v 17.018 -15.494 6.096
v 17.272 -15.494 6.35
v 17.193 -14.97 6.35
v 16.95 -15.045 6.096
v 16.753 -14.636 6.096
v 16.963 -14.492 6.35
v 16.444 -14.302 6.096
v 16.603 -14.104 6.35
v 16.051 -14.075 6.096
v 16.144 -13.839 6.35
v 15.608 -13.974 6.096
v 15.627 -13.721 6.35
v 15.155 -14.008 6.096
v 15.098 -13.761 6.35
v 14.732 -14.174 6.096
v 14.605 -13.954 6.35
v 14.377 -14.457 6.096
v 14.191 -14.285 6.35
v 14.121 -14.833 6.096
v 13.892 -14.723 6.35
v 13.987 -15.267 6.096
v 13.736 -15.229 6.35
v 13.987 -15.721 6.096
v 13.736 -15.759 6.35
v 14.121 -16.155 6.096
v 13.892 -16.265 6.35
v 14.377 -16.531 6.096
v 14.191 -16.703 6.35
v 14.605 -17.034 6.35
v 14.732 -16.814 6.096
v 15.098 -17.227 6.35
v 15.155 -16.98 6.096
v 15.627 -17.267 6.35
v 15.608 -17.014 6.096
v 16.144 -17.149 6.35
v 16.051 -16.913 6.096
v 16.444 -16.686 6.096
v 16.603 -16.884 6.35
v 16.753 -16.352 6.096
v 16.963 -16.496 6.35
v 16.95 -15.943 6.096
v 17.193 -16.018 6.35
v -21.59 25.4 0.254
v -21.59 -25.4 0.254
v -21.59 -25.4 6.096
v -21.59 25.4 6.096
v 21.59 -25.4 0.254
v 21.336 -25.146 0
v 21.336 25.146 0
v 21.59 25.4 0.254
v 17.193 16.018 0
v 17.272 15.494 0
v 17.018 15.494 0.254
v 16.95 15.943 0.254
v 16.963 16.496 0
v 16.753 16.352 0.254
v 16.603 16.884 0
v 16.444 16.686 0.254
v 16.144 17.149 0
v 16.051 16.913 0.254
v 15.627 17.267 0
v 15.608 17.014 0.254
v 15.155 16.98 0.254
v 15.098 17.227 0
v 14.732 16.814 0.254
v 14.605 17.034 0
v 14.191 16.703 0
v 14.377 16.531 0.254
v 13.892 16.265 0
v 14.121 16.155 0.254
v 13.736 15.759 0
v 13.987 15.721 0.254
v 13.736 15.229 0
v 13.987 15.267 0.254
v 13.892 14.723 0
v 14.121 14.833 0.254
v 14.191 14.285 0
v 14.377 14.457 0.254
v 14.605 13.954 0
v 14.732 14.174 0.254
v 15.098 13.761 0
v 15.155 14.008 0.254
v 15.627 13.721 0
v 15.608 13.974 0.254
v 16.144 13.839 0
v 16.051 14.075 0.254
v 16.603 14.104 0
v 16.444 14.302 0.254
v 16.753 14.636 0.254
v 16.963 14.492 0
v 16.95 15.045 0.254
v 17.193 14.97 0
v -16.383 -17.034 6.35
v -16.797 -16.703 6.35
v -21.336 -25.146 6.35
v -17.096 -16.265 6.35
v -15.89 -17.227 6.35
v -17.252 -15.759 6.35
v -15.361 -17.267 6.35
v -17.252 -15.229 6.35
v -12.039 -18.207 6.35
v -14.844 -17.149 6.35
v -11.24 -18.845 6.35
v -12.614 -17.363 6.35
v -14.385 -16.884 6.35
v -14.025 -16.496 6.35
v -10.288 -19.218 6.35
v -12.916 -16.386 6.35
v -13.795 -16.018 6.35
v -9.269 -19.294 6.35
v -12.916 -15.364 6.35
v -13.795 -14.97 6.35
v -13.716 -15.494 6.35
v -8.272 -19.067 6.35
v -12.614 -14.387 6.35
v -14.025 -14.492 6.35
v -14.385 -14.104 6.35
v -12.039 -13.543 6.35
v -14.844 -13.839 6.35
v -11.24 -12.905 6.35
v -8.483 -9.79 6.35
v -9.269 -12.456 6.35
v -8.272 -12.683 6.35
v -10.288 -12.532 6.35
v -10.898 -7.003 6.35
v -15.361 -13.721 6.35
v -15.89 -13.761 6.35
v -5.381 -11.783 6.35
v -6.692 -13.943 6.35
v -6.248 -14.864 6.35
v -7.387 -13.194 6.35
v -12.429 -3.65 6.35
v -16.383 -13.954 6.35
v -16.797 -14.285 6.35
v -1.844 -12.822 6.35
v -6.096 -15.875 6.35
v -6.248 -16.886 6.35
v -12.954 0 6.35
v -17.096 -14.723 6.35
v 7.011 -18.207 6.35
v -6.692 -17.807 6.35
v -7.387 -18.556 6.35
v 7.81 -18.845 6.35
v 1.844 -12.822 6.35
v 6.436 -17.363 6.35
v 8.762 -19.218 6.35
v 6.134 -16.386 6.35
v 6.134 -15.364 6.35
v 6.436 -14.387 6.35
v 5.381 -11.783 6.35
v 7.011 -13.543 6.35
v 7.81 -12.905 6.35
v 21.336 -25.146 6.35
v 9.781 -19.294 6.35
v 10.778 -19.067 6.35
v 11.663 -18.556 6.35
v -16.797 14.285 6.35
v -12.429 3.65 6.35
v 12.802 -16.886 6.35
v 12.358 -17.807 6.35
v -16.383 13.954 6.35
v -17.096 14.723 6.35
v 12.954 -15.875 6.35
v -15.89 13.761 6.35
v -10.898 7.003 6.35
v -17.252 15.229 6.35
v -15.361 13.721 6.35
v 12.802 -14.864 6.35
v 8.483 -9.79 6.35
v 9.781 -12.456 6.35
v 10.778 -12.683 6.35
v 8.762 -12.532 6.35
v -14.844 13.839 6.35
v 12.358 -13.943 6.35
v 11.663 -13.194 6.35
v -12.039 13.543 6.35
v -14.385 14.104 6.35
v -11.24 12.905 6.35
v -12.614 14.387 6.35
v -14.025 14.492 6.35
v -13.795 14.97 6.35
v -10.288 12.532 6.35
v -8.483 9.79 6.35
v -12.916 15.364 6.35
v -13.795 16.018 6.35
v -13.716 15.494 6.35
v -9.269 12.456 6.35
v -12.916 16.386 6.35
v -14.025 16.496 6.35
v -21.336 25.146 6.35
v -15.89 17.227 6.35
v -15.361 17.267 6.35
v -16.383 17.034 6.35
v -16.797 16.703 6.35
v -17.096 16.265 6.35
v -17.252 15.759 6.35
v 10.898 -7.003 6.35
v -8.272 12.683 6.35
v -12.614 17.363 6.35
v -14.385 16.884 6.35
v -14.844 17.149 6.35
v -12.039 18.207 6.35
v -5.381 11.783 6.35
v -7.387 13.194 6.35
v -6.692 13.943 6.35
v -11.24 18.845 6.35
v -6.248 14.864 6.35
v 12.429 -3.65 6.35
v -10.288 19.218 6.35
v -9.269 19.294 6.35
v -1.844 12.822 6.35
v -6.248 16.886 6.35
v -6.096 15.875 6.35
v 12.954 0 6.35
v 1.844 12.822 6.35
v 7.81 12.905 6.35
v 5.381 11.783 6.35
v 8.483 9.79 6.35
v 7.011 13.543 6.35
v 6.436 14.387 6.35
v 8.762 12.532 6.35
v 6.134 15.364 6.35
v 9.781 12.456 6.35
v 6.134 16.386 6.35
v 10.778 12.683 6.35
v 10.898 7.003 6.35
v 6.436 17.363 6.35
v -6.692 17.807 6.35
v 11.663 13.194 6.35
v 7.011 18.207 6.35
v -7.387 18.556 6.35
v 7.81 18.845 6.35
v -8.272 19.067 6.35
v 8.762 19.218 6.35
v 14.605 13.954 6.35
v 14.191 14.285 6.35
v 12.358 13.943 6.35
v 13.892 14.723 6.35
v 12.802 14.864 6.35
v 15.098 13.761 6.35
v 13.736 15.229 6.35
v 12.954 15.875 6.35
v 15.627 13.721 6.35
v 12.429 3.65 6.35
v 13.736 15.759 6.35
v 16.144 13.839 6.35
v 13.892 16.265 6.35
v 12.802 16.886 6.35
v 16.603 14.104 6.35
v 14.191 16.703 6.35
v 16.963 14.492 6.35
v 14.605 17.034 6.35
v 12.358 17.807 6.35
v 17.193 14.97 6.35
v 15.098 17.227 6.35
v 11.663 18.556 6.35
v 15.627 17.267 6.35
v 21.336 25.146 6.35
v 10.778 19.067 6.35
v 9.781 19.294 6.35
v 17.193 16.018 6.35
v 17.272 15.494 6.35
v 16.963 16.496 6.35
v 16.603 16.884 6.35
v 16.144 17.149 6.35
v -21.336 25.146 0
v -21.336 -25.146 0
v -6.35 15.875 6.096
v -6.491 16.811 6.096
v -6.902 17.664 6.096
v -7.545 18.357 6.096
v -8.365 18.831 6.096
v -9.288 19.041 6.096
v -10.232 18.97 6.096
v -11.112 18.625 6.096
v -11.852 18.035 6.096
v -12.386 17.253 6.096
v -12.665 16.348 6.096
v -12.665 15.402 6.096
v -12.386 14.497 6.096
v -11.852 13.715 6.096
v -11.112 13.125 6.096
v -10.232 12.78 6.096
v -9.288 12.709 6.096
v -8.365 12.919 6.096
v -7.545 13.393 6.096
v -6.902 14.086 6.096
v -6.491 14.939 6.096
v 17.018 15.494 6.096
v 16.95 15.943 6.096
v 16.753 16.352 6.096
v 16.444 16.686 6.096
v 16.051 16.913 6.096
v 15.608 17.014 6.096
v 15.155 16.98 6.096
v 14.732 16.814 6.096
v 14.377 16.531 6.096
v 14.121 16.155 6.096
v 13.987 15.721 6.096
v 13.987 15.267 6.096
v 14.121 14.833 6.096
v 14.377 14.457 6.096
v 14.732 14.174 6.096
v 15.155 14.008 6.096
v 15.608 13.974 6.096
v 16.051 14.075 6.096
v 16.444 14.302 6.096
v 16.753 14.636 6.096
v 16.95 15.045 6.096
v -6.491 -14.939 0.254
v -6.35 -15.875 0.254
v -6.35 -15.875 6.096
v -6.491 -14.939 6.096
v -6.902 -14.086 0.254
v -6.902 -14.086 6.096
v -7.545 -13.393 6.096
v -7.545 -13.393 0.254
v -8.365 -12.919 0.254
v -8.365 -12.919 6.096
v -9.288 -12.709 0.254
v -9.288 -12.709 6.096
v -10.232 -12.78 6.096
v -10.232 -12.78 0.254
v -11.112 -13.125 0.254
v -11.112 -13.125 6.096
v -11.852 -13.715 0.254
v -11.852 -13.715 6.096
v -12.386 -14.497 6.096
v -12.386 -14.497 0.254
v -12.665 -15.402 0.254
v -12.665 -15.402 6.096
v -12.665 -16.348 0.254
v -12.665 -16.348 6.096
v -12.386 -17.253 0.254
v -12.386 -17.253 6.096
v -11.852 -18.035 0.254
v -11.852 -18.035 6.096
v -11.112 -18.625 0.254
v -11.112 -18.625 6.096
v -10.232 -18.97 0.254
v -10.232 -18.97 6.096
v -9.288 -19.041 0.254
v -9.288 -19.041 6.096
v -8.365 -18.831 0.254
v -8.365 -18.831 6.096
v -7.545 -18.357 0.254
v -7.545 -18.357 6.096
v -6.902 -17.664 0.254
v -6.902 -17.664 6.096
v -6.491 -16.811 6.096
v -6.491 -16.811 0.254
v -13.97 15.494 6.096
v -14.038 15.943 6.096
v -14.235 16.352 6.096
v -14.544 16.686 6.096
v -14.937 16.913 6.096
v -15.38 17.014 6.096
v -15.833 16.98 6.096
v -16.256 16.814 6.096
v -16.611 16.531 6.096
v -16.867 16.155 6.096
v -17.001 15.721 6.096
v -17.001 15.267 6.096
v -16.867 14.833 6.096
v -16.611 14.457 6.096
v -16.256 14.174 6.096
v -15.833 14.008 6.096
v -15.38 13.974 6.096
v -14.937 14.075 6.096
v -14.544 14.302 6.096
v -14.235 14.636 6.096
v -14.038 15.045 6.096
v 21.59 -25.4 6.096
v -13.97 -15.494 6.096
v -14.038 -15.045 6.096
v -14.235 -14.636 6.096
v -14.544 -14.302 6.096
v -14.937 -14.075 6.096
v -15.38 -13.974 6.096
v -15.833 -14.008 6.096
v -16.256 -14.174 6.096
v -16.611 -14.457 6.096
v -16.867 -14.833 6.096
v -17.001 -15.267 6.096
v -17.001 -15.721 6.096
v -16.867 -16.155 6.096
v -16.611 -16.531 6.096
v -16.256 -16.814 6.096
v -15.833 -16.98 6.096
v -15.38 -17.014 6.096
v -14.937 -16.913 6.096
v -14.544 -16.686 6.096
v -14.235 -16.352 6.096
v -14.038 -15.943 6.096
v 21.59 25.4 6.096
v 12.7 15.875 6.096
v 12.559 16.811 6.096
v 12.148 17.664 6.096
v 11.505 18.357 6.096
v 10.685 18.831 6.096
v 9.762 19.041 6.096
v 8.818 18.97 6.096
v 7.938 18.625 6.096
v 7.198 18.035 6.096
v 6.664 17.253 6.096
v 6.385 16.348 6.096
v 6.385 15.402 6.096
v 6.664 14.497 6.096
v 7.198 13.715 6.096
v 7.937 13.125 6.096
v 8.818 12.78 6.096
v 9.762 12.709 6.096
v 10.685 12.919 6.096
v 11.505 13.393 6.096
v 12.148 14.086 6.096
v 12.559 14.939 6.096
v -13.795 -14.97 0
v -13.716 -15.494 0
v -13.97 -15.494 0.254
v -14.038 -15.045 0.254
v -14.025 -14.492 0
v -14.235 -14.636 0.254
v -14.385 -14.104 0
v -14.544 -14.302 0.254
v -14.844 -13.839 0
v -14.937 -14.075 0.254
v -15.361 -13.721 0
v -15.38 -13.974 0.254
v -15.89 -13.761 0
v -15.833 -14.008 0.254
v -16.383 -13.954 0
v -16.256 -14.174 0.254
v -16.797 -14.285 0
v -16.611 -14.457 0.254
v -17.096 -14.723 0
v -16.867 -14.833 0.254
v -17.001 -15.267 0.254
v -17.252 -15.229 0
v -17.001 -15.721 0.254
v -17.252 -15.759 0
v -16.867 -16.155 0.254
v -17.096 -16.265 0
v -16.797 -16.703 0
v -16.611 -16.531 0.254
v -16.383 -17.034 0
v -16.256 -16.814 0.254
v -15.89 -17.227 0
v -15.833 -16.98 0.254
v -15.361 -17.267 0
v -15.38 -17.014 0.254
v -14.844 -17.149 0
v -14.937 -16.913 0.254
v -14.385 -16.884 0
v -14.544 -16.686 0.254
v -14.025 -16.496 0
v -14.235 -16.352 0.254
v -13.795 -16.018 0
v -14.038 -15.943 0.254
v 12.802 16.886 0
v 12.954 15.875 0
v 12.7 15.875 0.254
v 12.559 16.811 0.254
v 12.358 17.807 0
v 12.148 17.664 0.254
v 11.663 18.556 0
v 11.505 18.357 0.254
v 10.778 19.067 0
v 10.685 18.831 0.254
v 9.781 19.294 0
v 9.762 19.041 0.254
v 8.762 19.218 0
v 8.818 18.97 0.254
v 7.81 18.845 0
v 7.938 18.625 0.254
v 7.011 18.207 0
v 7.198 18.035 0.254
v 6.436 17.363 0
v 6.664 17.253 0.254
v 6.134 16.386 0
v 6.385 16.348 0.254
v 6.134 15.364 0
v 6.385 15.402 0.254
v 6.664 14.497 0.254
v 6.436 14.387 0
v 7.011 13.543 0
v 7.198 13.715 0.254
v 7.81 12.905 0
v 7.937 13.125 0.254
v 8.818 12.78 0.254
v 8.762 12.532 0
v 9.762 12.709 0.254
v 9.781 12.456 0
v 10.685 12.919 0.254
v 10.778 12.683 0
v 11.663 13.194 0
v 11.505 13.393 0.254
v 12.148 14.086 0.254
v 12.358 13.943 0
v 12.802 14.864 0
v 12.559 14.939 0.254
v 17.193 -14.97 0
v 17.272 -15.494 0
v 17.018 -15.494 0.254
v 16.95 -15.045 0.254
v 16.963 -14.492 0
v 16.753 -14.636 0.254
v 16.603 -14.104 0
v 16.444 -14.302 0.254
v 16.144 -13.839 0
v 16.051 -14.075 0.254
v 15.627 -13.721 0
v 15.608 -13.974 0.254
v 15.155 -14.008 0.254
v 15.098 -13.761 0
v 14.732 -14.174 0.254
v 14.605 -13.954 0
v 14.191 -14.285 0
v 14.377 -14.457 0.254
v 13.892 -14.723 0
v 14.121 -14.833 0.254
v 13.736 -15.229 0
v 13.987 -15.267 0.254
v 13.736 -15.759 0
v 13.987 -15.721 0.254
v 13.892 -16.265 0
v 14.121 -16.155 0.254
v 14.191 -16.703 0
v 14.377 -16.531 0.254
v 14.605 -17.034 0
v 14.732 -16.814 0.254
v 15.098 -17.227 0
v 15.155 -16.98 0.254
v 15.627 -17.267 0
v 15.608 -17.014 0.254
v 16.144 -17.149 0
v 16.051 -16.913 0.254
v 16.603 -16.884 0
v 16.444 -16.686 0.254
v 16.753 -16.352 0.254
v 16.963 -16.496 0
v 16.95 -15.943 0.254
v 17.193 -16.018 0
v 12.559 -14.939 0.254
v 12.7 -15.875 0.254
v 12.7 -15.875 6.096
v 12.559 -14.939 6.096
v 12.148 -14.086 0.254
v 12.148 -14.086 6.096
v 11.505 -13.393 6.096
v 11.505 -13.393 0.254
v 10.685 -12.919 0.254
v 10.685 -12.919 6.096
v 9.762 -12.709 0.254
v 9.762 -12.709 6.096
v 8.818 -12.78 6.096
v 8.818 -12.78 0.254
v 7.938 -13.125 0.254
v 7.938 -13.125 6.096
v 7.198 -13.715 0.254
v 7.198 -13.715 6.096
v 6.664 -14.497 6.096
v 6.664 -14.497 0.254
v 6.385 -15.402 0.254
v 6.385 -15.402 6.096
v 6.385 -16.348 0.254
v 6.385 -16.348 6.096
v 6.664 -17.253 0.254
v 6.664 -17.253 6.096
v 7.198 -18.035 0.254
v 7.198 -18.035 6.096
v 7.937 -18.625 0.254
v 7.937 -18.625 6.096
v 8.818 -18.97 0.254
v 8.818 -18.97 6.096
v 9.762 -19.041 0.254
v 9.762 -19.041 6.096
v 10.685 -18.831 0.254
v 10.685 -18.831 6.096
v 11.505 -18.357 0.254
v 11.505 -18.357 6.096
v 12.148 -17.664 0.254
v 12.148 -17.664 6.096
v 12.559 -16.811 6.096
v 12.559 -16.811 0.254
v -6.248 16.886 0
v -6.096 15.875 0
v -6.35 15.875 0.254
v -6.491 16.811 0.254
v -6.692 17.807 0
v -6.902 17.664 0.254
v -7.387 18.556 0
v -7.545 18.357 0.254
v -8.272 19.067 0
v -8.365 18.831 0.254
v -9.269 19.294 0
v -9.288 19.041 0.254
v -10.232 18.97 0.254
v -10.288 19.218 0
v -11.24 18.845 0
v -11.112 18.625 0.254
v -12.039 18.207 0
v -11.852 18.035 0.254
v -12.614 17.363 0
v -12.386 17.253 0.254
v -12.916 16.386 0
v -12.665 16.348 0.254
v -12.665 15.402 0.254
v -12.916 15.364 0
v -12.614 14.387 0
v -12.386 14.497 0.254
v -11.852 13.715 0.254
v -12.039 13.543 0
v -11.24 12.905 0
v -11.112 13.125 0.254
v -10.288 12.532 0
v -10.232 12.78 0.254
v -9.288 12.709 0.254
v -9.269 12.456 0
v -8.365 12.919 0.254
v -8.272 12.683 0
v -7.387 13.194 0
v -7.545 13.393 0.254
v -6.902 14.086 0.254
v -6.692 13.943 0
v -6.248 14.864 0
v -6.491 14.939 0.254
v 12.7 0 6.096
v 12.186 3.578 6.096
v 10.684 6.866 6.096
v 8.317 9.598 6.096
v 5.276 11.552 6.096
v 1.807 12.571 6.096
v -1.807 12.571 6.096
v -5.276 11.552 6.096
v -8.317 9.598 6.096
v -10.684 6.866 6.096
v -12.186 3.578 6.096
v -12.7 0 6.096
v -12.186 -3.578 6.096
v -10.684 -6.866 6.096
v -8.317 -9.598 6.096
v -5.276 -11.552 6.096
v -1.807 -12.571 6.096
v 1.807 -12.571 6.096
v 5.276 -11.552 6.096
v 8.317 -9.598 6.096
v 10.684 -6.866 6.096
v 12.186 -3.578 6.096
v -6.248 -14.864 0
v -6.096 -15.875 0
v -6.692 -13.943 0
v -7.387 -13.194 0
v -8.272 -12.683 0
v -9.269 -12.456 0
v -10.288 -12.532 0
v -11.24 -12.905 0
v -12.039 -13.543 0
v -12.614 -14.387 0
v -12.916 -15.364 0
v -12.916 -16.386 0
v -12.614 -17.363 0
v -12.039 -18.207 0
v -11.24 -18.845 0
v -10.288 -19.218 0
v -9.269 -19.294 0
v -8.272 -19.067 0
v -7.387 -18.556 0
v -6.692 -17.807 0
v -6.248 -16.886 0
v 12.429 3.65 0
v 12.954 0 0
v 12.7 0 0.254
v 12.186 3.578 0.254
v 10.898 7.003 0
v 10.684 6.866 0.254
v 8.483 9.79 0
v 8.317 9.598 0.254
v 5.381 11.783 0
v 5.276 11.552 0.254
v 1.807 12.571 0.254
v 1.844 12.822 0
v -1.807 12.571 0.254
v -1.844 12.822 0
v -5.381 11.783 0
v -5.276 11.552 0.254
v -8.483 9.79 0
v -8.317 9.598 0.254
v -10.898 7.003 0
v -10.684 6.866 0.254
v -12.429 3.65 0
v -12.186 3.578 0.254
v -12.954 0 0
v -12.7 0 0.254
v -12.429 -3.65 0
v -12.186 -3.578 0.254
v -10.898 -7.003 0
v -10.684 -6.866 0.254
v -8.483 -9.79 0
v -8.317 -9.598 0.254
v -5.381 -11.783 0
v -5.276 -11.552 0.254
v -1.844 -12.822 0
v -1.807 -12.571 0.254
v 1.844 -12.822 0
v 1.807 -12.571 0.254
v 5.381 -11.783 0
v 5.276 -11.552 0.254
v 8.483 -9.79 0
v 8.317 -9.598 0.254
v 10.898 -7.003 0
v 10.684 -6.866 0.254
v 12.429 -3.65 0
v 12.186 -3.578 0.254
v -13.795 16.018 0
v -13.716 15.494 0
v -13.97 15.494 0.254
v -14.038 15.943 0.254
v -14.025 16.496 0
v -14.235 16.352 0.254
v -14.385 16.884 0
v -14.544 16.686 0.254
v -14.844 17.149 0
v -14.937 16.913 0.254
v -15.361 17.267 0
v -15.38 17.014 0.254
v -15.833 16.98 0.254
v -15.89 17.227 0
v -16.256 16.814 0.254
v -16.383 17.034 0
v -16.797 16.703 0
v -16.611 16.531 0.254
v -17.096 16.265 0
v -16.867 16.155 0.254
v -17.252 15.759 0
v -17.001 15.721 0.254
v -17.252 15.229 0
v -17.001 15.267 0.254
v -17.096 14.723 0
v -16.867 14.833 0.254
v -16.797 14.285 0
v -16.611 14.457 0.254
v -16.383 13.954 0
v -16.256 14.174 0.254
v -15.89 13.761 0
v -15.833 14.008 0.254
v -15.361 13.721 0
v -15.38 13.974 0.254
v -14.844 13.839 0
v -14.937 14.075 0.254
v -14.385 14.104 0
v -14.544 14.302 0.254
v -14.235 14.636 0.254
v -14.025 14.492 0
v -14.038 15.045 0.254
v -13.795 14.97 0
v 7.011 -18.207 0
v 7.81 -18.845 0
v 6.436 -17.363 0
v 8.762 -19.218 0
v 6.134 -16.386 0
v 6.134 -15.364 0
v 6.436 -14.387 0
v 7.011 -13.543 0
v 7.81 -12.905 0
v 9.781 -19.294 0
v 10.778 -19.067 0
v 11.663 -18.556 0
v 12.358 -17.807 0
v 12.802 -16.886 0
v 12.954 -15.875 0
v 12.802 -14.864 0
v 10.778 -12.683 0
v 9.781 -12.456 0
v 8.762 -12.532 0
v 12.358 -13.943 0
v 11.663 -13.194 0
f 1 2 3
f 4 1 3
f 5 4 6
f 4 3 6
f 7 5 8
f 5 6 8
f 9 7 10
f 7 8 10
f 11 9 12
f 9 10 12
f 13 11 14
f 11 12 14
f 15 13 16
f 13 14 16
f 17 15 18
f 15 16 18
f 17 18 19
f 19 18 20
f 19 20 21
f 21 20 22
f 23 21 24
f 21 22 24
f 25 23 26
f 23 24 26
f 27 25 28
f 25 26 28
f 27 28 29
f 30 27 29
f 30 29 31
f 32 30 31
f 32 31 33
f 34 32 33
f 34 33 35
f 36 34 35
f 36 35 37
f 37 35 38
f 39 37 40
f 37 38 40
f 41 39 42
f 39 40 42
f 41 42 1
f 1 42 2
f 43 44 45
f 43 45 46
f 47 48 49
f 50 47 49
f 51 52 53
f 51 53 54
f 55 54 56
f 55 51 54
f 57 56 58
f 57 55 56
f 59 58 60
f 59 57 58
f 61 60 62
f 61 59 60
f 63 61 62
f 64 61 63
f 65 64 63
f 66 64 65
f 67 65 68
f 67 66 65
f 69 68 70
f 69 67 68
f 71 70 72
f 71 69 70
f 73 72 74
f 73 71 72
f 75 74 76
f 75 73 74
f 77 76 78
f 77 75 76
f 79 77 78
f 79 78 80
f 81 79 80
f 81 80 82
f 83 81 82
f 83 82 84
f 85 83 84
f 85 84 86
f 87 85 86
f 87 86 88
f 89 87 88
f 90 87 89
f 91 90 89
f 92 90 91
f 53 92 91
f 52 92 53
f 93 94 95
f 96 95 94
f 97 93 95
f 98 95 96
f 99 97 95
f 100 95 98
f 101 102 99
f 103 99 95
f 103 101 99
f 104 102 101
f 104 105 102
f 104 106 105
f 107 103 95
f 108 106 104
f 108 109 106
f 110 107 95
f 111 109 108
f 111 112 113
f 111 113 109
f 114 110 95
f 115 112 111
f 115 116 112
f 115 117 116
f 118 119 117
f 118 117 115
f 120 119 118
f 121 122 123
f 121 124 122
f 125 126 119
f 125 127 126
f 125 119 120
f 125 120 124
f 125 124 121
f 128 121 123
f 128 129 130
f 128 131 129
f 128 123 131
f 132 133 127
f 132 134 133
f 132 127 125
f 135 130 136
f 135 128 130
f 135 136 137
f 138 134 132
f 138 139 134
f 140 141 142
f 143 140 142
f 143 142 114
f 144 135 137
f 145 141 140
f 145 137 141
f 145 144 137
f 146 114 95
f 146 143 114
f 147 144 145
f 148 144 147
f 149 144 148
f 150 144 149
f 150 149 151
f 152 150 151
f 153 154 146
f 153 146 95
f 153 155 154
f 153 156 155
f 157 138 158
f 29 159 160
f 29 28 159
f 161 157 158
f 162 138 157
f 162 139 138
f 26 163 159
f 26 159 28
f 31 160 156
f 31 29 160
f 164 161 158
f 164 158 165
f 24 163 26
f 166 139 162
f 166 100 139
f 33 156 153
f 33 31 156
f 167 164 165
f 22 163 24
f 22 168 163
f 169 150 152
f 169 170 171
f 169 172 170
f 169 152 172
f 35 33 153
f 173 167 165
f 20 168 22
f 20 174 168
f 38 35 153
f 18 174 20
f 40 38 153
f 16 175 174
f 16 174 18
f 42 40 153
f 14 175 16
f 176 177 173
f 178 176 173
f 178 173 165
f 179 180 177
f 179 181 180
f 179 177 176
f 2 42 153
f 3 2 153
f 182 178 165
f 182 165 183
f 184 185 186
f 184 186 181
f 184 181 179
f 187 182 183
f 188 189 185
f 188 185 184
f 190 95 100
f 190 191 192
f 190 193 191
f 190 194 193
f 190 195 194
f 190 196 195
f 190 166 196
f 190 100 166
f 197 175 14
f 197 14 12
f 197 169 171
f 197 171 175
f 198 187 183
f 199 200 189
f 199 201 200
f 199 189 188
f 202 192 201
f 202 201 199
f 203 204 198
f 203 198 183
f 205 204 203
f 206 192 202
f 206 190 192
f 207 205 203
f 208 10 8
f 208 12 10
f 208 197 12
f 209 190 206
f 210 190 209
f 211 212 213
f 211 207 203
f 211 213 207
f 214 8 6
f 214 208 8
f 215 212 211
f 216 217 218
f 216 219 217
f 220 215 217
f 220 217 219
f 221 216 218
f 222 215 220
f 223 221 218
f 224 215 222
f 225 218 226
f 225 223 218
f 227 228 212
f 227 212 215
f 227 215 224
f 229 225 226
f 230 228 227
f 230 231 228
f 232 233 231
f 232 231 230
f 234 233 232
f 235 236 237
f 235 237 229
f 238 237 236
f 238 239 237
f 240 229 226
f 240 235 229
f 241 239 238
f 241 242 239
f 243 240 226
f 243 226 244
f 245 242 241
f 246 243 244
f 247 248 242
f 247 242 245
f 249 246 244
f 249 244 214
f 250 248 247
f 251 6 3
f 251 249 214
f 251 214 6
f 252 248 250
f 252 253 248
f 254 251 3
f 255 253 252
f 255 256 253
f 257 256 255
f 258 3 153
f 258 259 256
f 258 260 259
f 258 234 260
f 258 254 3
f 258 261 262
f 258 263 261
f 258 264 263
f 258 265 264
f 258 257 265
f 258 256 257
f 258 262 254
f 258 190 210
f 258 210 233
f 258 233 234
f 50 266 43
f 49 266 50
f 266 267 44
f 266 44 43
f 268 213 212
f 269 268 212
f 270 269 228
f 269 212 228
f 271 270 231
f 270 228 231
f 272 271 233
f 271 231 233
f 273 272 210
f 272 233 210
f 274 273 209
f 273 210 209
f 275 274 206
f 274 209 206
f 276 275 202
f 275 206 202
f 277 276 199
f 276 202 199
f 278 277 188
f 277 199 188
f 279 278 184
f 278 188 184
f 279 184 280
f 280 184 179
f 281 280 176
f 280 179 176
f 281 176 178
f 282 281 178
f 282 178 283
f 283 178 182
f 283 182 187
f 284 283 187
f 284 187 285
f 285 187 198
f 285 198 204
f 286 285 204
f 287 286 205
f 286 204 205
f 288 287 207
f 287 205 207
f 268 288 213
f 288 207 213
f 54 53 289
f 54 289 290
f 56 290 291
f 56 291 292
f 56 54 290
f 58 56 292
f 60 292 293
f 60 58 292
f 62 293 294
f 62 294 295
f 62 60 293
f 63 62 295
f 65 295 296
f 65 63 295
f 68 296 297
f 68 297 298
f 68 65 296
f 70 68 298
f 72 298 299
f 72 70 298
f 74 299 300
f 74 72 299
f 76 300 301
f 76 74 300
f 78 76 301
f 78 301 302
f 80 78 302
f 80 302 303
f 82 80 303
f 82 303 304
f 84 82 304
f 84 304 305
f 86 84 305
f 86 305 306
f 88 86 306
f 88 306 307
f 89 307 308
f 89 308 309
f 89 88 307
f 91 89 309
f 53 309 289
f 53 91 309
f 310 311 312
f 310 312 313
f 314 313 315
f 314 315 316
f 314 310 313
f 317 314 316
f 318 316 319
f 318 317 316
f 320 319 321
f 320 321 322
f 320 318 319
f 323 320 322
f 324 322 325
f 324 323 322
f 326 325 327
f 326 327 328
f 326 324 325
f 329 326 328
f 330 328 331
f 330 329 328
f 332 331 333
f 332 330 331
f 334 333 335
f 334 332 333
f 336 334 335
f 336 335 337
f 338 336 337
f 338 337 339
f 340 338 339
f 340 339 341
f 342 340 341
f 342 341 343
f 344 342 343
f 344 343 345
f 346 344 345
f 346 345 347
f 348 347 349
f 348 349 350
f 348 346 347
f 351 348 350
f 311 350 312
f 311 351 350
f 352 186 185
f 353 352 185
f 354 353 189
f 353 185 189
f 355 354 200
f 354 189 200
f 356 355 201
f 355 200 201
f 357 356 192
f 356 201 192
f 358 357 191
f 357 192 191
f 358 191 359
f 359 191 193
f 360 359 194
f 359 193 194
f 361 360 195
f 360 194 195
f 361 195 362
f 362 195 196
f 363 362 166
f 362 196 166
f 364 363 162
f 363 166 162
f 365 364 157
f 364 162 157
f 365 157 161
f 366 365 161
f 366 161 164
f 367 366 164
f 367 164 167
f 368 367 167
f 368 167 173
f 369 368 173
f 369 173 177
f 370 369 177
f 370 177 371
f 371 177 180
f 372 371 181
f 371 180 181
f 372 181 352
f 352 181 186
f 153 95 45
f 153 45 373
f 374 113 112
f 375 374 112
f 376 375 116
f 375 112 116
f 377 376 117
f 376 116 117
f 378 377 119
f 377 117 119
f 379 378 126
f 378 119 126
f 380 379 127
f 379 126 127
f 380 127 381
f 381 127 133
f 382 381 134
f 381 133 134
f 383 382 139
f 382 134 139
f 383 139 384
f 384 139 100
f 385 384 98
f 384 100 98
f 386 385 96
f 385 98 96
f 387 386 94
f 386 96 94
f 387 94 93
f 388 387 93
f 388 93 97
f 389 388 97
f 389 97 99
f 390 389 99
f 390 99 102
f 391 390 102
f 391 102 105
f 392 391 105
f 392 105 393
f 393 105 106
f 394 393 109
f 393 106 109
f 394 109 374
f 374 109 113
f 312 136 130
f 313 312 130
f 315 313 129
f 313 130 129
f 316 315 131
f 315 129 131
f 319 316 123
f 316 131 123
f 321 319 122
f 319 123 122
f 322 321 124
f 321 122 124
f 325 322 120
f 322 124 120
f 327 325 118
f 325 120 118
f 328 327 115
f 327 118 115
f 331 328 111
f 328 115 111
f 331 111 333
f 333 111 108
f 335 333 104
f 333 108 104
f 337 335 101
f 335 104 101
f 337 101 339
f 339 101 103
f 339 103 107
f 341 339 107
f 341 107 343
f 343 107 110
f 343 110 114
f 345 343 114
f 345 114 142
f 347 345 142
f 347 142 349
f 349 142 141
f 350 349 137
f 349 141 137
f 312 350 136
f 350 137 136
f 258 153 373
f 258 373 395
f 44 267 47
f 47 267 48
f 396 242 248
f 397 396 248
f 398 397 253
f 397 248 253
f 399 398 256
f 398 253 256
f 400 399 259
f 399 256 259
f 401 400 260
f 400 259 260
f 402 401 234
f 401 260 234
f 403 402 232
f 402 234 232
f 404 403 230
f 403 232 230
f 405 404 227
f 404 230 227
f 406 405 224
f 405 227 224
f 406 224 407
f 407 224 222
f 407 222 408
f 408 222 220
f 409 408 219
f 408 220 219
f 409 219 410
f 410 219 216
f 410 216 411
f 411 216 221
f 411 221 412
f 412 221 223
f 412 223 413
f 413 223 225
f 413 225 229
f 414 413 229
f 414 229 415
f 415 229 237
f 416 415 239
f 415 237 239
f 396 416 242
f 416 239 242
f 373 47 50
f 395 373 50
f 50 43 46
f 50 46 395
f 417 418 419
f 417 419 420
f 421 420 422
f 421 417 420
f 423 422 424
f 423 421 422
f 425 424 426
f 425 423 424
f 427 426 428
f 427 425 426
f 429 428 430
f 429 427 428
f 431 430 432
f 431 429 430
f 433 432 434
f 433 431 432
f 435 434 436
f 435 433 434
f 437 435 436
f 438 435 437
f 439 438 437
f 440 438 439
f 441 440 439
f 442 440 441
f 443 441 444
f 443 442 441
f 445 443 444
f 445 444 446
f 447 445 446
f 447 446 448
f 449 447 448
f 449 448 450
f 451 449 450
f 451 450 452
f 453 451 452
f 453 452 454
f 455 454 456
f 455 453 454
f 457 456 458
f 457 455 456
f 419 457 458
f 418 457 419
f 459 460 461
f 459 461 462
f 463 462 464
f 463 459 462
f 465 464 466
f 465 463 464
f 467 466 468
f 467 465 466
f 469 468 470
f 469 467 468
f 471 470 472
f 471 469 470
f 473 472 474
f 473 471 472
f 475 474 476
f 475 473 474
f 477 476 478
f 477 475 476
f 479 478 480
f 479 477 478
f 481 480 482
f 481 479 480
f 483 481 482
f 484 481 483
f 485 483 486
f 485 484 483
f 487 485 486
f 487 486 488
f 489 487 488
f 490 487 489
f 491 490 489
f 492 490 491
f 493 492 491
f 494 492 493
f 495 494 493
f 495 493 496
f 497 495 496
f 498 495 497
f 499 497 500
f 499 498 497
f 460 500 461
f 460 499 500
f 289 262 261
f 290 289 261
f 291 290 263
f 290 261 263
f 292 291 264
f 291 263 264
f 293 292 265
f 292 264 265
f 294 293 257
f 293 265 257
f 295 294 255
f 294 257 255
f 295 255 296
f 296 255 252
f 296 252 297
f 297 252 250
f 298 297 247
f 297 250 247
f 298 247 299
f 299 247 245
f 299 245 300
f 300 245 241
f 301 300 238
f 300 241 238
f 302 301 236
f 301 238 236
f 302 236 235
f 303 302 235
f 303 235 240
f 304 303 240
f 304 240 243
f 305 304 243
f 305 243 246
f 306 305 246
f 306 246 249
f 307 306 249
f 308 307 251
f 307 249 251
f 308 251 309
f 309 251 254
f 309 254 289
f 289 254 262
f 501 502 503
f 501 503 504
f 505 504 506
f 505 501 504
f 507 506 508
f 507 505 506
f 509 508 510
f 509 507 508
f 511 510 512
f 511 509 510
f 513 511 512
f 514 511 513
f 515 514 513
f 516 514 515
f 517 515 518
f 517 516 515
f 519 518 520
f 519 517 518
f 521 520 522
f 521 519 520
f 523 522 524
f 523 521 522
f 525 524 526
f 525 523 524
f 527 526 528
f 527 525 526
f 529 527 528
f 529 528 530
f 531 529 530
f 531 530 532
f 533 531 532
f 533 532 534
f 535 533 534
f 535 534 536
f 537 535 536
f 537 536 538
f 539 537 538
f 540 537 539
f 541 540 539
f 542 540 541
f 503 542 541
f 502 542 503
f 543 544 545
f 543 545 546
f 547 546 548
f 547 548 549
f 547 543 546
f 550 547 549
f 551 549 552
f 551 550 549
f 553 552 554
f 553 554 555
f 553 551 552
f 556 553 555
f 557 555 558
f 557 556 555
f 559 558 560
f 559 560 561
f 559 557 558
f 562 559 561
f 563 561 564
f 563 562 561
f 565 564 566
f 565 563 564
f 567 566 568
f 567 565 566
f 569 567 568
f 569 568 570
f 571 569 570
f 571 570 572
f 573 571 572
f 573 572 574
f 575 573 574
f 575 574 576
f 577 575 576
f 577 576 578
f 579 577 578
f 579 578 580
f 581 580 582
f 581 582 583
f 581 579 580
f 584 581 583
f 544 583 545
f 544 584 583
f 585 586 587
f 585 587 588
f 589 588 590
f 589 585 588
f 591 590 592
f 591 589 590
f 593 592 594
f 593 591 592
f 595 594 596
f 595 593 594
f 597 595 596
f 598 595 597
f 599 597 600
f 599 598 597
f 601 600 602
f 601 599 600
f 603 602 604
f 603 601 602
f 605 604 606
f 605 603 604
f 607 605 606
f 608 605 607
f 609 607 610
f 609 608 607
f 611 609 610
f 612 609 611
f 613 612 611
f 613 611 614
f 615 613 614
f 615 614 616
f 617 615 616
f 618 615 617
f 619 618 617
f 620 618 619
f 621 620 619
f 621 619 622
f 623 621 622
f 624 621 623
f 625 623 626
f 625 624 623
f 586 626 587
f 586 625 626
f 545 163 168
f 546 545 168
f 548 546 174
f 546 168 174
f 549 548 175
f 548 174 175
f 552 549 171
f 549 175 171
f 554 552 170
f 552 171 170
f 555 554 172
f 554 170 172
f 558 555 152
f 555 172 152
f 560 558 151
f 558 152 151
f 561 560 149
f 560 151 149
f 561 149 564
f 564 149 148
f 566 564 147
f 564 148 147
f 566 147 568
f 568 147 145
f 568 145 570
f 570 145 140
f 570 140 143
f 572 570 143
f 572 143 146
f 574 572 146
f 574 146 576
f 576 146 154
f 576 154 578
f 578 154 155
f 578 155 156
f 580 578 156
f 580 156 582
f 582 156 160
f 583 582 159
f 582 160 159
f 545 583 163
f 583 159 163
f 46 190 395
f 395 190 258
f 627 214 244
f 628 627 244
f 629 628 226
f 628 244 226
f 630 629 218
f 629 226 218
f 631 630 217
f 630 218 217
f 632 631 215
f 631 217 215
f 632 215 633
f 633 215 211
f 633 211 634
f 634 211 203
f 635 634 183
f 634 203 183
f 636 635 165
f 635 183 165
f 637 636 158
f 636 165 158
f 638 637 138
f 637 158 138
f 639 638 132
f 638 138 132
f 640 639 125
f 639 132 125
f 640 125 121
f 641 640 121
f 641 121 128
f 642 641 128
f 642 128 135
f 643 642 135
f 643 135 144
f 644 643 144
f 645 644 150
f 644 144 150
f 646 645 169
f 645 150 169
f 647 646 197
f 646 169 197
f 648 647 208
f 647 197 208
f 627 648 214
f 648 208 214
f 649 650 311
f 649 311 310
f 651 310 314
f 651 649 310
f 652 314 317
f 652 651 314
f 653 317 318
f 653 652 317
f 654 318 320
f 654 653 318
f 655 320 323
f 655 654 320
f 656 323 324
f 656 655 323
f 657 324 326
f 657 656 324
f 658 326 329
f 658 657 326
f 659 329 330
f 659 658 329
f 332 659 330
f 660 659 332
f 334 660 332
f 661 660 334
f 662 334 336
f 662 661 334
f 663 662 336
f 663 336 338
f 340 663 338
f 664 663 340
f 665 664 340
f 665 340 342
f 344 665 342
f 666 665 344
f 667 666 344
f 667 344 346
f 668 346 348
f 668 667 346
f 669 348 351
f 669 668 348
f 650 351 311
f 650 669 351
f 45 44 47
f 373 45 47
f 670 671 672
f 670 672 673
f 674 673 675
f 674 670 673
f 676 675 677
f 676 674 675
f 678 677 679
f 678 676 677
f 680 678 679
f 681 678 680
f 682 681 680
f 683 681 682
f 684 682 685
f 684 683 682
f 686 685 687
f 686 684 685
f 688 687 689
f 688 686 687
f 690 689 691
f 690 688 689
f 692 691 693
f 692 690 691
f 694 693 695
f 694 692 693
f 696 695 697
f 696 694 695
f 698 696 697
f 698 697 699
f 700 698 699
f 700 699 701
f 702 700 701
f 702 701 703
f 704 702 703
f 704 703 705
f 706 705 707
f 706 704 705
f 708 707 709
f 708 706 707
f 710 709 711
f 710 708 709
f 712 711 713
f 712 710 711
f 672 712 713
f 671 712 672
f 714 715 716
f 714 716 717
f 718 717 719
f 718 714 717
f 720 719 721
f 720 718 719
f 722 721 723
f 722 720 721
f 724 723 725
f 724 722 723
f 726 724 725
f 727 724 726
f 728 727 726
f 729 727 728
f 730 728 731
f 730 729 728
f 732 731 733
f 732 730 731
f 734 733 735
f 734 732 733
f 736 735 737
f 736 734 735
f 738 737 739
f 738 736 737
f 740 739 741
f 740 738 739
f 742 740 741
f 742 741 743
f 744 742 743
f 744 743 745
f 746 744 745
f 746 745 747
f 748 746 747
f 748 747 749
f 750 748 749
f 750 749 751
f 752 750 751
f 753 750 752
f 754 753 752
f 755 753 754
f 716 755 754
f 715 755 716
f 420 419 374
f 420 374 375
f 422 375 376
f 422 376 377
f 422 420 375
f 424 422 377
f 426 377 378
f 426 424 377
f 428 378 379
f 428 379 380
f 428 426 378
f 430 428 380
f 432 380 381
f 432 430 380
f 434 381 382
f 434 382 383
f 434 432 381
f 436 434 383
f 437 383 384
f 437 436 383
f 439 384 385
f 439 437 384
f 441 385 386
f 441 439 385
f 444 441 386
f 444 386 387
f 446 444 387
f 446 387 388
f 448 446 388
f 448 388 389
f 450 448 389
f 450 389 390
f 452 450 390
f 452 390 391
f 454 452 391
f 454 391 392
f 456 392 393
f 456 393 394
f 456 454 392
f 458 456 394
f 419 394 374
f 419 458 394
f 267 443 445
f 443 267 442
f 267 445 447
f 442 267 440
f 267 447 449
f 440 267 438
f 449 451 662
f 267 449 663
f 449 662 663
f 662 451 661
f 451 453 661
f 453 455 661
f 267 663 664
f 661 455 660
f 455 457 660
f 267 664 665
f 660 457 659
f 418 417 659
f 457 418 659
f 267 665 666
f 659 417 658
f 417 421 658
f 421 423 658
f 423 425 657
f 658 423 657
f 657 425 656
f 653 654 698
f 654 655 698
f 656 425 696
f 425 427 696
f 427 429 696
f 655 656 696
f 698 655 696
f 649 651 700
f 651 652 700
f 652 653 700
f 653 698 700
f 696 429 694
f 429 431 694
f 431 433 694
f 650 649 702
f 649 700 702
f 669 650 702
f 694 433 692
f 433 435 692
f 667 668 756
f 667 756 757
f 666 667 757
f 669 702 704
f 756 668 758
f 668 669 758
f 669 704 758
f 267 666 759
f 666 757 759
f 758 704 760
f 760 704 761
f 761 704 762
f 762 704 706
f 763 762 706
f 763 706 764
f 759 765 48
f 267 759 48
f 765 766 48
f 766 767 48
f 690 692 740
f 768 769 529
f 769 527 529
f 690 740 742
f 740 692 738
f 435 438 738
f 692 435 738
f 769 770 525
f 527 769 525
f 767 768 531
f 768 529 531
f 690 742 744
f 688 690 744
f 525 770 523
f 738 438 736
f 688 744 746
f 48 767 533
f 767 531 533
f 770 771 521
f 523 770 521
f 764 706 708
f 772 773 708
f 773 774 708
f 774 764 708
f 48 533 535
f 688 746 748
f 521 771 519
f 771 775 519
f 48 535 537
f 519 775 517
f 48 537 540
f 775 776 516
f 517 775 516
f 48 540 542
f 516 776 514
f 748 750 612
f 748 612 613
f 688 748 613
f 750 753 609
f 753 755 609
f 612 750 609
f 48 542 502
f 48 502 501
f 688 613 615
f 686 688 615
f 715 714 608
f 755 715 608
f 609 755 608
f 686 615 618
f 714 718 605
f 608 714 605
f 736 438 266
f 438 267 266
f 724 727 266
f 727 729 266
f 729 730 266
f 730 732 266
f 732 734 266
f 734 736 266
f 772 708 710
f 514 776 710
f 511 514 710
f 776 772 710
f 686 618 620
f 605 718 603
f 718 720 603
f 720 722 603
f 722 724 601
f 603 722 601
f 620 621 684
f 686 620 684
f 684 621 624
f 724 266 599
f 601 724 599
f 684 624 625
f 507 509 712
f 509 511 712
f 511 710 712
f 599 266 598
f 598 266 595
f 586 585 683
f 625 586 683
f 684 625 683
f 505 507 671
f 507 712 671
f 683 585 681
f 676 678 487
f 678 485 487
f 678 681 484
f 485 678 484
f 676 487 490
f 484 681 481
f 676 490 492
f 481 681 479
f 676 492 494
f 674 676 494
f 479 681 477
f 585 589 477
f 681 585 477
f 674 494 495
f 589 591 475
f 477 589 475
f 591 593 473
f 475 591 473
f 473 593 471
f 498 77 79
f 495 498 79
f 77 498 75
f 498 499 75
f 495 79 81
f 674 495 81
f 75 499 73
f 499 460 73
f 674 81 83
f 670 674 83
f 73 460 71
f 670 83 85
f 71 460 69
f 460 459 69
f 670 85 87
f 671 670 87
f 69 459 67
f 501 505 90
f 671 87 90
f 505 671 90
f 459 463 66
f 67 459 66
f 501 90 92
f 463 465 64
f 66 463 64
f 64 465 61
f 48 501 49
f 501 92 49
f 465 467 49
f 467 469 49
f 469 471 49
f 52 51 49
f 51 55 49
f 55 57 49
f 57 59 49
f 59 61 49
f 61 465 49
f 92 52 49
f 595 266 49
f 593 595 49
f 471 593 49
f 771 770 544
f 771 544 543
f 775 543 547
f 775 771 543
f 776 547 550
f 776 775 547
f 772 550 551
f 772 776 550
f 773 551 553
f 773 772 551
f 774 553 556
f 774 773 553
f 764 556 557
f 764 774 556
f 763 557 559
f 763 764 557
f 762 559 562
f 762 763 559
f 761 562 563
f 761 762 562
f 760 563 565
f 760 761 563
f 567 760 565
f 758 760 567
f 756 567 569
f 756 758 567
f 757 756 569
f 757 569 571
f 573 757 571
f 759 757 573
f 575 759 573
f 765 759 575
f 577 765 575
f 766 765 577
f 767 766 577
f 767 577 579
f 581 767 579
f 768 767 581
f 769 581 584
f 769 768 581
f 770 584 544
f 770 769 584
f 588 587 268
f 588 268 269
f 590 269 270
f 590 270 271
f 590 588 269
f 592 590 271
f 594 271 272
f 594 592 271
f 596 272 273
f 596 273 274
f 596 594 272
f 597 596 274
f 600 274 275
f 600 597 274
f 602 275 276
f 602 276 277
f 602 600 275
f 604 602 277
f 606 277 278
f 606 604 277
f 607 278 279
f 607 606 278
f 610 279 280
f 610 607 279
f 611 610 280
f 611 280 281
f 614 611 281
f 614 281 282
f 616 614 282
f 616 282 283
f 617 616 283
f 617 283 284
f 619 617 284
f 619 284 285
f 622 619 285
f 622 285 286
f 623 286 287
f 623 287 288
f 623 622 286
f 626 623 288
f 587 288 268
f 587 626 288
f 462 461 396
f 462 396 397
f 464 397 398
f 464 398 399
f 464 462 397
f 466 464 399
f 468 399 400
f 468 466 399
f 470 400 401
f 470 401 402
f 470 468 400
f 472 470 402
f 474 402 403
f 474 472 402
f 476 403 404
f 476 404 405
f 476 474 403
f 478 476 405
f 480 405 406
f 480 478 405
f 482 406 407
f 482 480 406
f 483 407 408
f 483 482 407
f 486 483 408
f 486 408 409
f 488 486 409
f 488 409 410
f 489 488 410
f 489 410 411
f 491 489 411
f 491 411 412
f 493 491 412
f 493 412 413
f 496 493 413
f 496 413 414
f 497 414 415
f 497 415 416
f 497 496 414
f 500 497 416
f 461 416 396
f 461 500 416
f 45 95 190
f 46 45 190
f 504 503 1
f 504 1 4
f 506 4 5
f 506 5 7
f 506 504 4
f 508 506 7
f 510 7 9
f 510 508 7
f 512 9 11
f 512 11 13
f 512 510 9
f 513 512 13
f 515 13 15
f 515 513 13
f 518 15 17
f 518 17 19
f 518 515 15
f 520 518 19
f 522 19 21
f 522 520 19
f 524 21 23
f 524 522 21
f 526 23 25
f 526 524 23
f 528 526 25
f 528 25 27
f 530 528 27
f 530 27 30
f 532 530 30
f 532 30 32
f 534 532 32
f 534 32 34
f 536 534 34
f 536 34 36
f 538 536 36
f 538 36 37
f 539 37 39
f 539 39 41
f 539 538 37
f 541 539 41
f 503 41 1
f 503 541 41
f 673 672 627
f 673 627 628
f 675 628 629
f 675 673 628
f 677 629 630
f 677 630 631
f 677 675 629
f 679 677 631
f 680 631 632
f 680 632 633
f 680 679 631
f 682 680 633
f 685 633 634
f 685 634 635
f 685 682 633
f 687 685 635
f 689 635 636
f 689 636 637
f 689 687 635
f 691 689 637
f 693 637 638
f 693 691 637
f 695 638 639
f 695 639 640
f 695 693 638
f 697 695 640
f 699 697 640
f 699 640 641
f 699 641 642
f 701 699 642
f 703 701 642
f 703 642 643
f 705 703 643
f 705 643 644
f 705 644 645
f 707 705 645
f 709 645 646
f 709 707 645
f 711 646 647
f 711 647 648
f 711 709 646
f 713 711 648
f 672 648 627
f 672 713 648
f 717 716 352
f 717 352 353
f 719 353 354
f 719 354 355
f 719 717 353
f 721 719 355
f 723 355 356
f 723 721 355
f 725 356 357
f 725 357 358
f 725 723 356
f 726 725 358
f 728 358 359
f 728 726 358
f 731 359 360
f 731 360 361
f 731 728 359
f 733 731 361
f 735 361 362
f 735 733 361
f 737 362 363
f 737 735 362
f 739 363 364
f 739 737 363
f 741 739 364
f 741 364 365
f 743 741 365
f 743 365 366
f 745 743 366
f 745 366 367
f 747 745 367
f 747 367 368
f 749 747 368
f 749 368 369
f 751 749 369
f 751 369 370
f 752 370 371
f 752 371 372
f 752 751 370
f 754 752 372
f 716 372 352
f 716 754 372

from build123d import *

# Parameters (mm, degrees)
SKETCH1_W           = 43.18
SKETCH1_H           = 50.8
SKETCH1_R           = 1.524
SKETCH1_R_2         = 3.175
SKETCH1_R_3         = 12.7
BOSS_EXTRUDE1_DEPTH = 6.35
CHAMFER1_SIZE       = 0.254


with BuildPart() as part:
    # Sketch1 → Boss-Extrude1 (new body)
    with BuildSketch(Plane.XY):
        Rectangle(SKETCH1_W, SKETCH1_H)
        with Locations((-15.494, 15.494)):
            Circle(SKETCH1_R, mode=Mode.SUBTRACT)
        with Locations((-9.525, 15.875)):
            Circle(SKETCH1_R_2, mode=Mode.SUBTRACT)
        with Locations((-15.494, -15.494)):
            Circle(SKETCH1_R, mode=Mode.SUBTRACT)
        with Locations((-9.525, -15.875)):
            Circle(SKETCH1_R_2, mode=Mode.SUBTRACT)
        with Locations((9.525, -15.875)):
            Circle(SKETCH1_R_2, mode=Mode.SUBTRACT)
        with Locations((15.494, -15.494)):
            Circle(SKETCH1_R, mode=Mode.SUBTRACT)
        with Locations((9.525, 15.875)):
            Circle(SKETCH1_R_2, mode=Mode.SUBTRACT)
        with Locations((15.494, 15.494)):
            Circle(SKETCH1_R, mode=Mode.SUBTRACT)
        Circle(SKETCH1_R_3, mode=Mode.SUBTRACT)
    extrude(amount=BOSS_EXTRUDE1_DEPTH)

    # Chamfer1
    chamfer1_edges = [part.edges().sort_by_distance(p)[0] for p in [
        (-21.59, 0, 6.35),
        (-17.018, 15.494, 0),
        (-17.018, 15.494, 6.35),
        (0, -25.4, 6.35),
        (-12.7, 15.875, 0),
        (-12.7, 15.875, 6.35),
        (-17.018, -15.494, 0),
        (-17.018, -15.494, 6.35),
        (-12.7, -15.875, 0),
        (-12.7, -15.875, 6.35),
        (6.35, -15.875, 0),
        (6.35, -15.875, 6.35),
        (13.97, -15.494, 0),
        (13.97, -15.494, 6.35),
        (6.35, 15.875, 0),
        (6.35, 15.875, 6.35),
        (13.97, 15.494, 0),
        (13.97, 15.494, 6.35),
        (21.59, 0, 6.35),
        (-12.7, 0, 0),
        (-12.7, 0, 6.35),
        (0, -25.4, 0),
        (-21.59, 0, 0),
        (0, 25.4, 0),
        (21.59, 0, 0),
        (0, 25.4, 6.35),
    ]]
    chamfer(chamfer1_edges, length=CHAMFER1_SIZE)


solid = part.part
